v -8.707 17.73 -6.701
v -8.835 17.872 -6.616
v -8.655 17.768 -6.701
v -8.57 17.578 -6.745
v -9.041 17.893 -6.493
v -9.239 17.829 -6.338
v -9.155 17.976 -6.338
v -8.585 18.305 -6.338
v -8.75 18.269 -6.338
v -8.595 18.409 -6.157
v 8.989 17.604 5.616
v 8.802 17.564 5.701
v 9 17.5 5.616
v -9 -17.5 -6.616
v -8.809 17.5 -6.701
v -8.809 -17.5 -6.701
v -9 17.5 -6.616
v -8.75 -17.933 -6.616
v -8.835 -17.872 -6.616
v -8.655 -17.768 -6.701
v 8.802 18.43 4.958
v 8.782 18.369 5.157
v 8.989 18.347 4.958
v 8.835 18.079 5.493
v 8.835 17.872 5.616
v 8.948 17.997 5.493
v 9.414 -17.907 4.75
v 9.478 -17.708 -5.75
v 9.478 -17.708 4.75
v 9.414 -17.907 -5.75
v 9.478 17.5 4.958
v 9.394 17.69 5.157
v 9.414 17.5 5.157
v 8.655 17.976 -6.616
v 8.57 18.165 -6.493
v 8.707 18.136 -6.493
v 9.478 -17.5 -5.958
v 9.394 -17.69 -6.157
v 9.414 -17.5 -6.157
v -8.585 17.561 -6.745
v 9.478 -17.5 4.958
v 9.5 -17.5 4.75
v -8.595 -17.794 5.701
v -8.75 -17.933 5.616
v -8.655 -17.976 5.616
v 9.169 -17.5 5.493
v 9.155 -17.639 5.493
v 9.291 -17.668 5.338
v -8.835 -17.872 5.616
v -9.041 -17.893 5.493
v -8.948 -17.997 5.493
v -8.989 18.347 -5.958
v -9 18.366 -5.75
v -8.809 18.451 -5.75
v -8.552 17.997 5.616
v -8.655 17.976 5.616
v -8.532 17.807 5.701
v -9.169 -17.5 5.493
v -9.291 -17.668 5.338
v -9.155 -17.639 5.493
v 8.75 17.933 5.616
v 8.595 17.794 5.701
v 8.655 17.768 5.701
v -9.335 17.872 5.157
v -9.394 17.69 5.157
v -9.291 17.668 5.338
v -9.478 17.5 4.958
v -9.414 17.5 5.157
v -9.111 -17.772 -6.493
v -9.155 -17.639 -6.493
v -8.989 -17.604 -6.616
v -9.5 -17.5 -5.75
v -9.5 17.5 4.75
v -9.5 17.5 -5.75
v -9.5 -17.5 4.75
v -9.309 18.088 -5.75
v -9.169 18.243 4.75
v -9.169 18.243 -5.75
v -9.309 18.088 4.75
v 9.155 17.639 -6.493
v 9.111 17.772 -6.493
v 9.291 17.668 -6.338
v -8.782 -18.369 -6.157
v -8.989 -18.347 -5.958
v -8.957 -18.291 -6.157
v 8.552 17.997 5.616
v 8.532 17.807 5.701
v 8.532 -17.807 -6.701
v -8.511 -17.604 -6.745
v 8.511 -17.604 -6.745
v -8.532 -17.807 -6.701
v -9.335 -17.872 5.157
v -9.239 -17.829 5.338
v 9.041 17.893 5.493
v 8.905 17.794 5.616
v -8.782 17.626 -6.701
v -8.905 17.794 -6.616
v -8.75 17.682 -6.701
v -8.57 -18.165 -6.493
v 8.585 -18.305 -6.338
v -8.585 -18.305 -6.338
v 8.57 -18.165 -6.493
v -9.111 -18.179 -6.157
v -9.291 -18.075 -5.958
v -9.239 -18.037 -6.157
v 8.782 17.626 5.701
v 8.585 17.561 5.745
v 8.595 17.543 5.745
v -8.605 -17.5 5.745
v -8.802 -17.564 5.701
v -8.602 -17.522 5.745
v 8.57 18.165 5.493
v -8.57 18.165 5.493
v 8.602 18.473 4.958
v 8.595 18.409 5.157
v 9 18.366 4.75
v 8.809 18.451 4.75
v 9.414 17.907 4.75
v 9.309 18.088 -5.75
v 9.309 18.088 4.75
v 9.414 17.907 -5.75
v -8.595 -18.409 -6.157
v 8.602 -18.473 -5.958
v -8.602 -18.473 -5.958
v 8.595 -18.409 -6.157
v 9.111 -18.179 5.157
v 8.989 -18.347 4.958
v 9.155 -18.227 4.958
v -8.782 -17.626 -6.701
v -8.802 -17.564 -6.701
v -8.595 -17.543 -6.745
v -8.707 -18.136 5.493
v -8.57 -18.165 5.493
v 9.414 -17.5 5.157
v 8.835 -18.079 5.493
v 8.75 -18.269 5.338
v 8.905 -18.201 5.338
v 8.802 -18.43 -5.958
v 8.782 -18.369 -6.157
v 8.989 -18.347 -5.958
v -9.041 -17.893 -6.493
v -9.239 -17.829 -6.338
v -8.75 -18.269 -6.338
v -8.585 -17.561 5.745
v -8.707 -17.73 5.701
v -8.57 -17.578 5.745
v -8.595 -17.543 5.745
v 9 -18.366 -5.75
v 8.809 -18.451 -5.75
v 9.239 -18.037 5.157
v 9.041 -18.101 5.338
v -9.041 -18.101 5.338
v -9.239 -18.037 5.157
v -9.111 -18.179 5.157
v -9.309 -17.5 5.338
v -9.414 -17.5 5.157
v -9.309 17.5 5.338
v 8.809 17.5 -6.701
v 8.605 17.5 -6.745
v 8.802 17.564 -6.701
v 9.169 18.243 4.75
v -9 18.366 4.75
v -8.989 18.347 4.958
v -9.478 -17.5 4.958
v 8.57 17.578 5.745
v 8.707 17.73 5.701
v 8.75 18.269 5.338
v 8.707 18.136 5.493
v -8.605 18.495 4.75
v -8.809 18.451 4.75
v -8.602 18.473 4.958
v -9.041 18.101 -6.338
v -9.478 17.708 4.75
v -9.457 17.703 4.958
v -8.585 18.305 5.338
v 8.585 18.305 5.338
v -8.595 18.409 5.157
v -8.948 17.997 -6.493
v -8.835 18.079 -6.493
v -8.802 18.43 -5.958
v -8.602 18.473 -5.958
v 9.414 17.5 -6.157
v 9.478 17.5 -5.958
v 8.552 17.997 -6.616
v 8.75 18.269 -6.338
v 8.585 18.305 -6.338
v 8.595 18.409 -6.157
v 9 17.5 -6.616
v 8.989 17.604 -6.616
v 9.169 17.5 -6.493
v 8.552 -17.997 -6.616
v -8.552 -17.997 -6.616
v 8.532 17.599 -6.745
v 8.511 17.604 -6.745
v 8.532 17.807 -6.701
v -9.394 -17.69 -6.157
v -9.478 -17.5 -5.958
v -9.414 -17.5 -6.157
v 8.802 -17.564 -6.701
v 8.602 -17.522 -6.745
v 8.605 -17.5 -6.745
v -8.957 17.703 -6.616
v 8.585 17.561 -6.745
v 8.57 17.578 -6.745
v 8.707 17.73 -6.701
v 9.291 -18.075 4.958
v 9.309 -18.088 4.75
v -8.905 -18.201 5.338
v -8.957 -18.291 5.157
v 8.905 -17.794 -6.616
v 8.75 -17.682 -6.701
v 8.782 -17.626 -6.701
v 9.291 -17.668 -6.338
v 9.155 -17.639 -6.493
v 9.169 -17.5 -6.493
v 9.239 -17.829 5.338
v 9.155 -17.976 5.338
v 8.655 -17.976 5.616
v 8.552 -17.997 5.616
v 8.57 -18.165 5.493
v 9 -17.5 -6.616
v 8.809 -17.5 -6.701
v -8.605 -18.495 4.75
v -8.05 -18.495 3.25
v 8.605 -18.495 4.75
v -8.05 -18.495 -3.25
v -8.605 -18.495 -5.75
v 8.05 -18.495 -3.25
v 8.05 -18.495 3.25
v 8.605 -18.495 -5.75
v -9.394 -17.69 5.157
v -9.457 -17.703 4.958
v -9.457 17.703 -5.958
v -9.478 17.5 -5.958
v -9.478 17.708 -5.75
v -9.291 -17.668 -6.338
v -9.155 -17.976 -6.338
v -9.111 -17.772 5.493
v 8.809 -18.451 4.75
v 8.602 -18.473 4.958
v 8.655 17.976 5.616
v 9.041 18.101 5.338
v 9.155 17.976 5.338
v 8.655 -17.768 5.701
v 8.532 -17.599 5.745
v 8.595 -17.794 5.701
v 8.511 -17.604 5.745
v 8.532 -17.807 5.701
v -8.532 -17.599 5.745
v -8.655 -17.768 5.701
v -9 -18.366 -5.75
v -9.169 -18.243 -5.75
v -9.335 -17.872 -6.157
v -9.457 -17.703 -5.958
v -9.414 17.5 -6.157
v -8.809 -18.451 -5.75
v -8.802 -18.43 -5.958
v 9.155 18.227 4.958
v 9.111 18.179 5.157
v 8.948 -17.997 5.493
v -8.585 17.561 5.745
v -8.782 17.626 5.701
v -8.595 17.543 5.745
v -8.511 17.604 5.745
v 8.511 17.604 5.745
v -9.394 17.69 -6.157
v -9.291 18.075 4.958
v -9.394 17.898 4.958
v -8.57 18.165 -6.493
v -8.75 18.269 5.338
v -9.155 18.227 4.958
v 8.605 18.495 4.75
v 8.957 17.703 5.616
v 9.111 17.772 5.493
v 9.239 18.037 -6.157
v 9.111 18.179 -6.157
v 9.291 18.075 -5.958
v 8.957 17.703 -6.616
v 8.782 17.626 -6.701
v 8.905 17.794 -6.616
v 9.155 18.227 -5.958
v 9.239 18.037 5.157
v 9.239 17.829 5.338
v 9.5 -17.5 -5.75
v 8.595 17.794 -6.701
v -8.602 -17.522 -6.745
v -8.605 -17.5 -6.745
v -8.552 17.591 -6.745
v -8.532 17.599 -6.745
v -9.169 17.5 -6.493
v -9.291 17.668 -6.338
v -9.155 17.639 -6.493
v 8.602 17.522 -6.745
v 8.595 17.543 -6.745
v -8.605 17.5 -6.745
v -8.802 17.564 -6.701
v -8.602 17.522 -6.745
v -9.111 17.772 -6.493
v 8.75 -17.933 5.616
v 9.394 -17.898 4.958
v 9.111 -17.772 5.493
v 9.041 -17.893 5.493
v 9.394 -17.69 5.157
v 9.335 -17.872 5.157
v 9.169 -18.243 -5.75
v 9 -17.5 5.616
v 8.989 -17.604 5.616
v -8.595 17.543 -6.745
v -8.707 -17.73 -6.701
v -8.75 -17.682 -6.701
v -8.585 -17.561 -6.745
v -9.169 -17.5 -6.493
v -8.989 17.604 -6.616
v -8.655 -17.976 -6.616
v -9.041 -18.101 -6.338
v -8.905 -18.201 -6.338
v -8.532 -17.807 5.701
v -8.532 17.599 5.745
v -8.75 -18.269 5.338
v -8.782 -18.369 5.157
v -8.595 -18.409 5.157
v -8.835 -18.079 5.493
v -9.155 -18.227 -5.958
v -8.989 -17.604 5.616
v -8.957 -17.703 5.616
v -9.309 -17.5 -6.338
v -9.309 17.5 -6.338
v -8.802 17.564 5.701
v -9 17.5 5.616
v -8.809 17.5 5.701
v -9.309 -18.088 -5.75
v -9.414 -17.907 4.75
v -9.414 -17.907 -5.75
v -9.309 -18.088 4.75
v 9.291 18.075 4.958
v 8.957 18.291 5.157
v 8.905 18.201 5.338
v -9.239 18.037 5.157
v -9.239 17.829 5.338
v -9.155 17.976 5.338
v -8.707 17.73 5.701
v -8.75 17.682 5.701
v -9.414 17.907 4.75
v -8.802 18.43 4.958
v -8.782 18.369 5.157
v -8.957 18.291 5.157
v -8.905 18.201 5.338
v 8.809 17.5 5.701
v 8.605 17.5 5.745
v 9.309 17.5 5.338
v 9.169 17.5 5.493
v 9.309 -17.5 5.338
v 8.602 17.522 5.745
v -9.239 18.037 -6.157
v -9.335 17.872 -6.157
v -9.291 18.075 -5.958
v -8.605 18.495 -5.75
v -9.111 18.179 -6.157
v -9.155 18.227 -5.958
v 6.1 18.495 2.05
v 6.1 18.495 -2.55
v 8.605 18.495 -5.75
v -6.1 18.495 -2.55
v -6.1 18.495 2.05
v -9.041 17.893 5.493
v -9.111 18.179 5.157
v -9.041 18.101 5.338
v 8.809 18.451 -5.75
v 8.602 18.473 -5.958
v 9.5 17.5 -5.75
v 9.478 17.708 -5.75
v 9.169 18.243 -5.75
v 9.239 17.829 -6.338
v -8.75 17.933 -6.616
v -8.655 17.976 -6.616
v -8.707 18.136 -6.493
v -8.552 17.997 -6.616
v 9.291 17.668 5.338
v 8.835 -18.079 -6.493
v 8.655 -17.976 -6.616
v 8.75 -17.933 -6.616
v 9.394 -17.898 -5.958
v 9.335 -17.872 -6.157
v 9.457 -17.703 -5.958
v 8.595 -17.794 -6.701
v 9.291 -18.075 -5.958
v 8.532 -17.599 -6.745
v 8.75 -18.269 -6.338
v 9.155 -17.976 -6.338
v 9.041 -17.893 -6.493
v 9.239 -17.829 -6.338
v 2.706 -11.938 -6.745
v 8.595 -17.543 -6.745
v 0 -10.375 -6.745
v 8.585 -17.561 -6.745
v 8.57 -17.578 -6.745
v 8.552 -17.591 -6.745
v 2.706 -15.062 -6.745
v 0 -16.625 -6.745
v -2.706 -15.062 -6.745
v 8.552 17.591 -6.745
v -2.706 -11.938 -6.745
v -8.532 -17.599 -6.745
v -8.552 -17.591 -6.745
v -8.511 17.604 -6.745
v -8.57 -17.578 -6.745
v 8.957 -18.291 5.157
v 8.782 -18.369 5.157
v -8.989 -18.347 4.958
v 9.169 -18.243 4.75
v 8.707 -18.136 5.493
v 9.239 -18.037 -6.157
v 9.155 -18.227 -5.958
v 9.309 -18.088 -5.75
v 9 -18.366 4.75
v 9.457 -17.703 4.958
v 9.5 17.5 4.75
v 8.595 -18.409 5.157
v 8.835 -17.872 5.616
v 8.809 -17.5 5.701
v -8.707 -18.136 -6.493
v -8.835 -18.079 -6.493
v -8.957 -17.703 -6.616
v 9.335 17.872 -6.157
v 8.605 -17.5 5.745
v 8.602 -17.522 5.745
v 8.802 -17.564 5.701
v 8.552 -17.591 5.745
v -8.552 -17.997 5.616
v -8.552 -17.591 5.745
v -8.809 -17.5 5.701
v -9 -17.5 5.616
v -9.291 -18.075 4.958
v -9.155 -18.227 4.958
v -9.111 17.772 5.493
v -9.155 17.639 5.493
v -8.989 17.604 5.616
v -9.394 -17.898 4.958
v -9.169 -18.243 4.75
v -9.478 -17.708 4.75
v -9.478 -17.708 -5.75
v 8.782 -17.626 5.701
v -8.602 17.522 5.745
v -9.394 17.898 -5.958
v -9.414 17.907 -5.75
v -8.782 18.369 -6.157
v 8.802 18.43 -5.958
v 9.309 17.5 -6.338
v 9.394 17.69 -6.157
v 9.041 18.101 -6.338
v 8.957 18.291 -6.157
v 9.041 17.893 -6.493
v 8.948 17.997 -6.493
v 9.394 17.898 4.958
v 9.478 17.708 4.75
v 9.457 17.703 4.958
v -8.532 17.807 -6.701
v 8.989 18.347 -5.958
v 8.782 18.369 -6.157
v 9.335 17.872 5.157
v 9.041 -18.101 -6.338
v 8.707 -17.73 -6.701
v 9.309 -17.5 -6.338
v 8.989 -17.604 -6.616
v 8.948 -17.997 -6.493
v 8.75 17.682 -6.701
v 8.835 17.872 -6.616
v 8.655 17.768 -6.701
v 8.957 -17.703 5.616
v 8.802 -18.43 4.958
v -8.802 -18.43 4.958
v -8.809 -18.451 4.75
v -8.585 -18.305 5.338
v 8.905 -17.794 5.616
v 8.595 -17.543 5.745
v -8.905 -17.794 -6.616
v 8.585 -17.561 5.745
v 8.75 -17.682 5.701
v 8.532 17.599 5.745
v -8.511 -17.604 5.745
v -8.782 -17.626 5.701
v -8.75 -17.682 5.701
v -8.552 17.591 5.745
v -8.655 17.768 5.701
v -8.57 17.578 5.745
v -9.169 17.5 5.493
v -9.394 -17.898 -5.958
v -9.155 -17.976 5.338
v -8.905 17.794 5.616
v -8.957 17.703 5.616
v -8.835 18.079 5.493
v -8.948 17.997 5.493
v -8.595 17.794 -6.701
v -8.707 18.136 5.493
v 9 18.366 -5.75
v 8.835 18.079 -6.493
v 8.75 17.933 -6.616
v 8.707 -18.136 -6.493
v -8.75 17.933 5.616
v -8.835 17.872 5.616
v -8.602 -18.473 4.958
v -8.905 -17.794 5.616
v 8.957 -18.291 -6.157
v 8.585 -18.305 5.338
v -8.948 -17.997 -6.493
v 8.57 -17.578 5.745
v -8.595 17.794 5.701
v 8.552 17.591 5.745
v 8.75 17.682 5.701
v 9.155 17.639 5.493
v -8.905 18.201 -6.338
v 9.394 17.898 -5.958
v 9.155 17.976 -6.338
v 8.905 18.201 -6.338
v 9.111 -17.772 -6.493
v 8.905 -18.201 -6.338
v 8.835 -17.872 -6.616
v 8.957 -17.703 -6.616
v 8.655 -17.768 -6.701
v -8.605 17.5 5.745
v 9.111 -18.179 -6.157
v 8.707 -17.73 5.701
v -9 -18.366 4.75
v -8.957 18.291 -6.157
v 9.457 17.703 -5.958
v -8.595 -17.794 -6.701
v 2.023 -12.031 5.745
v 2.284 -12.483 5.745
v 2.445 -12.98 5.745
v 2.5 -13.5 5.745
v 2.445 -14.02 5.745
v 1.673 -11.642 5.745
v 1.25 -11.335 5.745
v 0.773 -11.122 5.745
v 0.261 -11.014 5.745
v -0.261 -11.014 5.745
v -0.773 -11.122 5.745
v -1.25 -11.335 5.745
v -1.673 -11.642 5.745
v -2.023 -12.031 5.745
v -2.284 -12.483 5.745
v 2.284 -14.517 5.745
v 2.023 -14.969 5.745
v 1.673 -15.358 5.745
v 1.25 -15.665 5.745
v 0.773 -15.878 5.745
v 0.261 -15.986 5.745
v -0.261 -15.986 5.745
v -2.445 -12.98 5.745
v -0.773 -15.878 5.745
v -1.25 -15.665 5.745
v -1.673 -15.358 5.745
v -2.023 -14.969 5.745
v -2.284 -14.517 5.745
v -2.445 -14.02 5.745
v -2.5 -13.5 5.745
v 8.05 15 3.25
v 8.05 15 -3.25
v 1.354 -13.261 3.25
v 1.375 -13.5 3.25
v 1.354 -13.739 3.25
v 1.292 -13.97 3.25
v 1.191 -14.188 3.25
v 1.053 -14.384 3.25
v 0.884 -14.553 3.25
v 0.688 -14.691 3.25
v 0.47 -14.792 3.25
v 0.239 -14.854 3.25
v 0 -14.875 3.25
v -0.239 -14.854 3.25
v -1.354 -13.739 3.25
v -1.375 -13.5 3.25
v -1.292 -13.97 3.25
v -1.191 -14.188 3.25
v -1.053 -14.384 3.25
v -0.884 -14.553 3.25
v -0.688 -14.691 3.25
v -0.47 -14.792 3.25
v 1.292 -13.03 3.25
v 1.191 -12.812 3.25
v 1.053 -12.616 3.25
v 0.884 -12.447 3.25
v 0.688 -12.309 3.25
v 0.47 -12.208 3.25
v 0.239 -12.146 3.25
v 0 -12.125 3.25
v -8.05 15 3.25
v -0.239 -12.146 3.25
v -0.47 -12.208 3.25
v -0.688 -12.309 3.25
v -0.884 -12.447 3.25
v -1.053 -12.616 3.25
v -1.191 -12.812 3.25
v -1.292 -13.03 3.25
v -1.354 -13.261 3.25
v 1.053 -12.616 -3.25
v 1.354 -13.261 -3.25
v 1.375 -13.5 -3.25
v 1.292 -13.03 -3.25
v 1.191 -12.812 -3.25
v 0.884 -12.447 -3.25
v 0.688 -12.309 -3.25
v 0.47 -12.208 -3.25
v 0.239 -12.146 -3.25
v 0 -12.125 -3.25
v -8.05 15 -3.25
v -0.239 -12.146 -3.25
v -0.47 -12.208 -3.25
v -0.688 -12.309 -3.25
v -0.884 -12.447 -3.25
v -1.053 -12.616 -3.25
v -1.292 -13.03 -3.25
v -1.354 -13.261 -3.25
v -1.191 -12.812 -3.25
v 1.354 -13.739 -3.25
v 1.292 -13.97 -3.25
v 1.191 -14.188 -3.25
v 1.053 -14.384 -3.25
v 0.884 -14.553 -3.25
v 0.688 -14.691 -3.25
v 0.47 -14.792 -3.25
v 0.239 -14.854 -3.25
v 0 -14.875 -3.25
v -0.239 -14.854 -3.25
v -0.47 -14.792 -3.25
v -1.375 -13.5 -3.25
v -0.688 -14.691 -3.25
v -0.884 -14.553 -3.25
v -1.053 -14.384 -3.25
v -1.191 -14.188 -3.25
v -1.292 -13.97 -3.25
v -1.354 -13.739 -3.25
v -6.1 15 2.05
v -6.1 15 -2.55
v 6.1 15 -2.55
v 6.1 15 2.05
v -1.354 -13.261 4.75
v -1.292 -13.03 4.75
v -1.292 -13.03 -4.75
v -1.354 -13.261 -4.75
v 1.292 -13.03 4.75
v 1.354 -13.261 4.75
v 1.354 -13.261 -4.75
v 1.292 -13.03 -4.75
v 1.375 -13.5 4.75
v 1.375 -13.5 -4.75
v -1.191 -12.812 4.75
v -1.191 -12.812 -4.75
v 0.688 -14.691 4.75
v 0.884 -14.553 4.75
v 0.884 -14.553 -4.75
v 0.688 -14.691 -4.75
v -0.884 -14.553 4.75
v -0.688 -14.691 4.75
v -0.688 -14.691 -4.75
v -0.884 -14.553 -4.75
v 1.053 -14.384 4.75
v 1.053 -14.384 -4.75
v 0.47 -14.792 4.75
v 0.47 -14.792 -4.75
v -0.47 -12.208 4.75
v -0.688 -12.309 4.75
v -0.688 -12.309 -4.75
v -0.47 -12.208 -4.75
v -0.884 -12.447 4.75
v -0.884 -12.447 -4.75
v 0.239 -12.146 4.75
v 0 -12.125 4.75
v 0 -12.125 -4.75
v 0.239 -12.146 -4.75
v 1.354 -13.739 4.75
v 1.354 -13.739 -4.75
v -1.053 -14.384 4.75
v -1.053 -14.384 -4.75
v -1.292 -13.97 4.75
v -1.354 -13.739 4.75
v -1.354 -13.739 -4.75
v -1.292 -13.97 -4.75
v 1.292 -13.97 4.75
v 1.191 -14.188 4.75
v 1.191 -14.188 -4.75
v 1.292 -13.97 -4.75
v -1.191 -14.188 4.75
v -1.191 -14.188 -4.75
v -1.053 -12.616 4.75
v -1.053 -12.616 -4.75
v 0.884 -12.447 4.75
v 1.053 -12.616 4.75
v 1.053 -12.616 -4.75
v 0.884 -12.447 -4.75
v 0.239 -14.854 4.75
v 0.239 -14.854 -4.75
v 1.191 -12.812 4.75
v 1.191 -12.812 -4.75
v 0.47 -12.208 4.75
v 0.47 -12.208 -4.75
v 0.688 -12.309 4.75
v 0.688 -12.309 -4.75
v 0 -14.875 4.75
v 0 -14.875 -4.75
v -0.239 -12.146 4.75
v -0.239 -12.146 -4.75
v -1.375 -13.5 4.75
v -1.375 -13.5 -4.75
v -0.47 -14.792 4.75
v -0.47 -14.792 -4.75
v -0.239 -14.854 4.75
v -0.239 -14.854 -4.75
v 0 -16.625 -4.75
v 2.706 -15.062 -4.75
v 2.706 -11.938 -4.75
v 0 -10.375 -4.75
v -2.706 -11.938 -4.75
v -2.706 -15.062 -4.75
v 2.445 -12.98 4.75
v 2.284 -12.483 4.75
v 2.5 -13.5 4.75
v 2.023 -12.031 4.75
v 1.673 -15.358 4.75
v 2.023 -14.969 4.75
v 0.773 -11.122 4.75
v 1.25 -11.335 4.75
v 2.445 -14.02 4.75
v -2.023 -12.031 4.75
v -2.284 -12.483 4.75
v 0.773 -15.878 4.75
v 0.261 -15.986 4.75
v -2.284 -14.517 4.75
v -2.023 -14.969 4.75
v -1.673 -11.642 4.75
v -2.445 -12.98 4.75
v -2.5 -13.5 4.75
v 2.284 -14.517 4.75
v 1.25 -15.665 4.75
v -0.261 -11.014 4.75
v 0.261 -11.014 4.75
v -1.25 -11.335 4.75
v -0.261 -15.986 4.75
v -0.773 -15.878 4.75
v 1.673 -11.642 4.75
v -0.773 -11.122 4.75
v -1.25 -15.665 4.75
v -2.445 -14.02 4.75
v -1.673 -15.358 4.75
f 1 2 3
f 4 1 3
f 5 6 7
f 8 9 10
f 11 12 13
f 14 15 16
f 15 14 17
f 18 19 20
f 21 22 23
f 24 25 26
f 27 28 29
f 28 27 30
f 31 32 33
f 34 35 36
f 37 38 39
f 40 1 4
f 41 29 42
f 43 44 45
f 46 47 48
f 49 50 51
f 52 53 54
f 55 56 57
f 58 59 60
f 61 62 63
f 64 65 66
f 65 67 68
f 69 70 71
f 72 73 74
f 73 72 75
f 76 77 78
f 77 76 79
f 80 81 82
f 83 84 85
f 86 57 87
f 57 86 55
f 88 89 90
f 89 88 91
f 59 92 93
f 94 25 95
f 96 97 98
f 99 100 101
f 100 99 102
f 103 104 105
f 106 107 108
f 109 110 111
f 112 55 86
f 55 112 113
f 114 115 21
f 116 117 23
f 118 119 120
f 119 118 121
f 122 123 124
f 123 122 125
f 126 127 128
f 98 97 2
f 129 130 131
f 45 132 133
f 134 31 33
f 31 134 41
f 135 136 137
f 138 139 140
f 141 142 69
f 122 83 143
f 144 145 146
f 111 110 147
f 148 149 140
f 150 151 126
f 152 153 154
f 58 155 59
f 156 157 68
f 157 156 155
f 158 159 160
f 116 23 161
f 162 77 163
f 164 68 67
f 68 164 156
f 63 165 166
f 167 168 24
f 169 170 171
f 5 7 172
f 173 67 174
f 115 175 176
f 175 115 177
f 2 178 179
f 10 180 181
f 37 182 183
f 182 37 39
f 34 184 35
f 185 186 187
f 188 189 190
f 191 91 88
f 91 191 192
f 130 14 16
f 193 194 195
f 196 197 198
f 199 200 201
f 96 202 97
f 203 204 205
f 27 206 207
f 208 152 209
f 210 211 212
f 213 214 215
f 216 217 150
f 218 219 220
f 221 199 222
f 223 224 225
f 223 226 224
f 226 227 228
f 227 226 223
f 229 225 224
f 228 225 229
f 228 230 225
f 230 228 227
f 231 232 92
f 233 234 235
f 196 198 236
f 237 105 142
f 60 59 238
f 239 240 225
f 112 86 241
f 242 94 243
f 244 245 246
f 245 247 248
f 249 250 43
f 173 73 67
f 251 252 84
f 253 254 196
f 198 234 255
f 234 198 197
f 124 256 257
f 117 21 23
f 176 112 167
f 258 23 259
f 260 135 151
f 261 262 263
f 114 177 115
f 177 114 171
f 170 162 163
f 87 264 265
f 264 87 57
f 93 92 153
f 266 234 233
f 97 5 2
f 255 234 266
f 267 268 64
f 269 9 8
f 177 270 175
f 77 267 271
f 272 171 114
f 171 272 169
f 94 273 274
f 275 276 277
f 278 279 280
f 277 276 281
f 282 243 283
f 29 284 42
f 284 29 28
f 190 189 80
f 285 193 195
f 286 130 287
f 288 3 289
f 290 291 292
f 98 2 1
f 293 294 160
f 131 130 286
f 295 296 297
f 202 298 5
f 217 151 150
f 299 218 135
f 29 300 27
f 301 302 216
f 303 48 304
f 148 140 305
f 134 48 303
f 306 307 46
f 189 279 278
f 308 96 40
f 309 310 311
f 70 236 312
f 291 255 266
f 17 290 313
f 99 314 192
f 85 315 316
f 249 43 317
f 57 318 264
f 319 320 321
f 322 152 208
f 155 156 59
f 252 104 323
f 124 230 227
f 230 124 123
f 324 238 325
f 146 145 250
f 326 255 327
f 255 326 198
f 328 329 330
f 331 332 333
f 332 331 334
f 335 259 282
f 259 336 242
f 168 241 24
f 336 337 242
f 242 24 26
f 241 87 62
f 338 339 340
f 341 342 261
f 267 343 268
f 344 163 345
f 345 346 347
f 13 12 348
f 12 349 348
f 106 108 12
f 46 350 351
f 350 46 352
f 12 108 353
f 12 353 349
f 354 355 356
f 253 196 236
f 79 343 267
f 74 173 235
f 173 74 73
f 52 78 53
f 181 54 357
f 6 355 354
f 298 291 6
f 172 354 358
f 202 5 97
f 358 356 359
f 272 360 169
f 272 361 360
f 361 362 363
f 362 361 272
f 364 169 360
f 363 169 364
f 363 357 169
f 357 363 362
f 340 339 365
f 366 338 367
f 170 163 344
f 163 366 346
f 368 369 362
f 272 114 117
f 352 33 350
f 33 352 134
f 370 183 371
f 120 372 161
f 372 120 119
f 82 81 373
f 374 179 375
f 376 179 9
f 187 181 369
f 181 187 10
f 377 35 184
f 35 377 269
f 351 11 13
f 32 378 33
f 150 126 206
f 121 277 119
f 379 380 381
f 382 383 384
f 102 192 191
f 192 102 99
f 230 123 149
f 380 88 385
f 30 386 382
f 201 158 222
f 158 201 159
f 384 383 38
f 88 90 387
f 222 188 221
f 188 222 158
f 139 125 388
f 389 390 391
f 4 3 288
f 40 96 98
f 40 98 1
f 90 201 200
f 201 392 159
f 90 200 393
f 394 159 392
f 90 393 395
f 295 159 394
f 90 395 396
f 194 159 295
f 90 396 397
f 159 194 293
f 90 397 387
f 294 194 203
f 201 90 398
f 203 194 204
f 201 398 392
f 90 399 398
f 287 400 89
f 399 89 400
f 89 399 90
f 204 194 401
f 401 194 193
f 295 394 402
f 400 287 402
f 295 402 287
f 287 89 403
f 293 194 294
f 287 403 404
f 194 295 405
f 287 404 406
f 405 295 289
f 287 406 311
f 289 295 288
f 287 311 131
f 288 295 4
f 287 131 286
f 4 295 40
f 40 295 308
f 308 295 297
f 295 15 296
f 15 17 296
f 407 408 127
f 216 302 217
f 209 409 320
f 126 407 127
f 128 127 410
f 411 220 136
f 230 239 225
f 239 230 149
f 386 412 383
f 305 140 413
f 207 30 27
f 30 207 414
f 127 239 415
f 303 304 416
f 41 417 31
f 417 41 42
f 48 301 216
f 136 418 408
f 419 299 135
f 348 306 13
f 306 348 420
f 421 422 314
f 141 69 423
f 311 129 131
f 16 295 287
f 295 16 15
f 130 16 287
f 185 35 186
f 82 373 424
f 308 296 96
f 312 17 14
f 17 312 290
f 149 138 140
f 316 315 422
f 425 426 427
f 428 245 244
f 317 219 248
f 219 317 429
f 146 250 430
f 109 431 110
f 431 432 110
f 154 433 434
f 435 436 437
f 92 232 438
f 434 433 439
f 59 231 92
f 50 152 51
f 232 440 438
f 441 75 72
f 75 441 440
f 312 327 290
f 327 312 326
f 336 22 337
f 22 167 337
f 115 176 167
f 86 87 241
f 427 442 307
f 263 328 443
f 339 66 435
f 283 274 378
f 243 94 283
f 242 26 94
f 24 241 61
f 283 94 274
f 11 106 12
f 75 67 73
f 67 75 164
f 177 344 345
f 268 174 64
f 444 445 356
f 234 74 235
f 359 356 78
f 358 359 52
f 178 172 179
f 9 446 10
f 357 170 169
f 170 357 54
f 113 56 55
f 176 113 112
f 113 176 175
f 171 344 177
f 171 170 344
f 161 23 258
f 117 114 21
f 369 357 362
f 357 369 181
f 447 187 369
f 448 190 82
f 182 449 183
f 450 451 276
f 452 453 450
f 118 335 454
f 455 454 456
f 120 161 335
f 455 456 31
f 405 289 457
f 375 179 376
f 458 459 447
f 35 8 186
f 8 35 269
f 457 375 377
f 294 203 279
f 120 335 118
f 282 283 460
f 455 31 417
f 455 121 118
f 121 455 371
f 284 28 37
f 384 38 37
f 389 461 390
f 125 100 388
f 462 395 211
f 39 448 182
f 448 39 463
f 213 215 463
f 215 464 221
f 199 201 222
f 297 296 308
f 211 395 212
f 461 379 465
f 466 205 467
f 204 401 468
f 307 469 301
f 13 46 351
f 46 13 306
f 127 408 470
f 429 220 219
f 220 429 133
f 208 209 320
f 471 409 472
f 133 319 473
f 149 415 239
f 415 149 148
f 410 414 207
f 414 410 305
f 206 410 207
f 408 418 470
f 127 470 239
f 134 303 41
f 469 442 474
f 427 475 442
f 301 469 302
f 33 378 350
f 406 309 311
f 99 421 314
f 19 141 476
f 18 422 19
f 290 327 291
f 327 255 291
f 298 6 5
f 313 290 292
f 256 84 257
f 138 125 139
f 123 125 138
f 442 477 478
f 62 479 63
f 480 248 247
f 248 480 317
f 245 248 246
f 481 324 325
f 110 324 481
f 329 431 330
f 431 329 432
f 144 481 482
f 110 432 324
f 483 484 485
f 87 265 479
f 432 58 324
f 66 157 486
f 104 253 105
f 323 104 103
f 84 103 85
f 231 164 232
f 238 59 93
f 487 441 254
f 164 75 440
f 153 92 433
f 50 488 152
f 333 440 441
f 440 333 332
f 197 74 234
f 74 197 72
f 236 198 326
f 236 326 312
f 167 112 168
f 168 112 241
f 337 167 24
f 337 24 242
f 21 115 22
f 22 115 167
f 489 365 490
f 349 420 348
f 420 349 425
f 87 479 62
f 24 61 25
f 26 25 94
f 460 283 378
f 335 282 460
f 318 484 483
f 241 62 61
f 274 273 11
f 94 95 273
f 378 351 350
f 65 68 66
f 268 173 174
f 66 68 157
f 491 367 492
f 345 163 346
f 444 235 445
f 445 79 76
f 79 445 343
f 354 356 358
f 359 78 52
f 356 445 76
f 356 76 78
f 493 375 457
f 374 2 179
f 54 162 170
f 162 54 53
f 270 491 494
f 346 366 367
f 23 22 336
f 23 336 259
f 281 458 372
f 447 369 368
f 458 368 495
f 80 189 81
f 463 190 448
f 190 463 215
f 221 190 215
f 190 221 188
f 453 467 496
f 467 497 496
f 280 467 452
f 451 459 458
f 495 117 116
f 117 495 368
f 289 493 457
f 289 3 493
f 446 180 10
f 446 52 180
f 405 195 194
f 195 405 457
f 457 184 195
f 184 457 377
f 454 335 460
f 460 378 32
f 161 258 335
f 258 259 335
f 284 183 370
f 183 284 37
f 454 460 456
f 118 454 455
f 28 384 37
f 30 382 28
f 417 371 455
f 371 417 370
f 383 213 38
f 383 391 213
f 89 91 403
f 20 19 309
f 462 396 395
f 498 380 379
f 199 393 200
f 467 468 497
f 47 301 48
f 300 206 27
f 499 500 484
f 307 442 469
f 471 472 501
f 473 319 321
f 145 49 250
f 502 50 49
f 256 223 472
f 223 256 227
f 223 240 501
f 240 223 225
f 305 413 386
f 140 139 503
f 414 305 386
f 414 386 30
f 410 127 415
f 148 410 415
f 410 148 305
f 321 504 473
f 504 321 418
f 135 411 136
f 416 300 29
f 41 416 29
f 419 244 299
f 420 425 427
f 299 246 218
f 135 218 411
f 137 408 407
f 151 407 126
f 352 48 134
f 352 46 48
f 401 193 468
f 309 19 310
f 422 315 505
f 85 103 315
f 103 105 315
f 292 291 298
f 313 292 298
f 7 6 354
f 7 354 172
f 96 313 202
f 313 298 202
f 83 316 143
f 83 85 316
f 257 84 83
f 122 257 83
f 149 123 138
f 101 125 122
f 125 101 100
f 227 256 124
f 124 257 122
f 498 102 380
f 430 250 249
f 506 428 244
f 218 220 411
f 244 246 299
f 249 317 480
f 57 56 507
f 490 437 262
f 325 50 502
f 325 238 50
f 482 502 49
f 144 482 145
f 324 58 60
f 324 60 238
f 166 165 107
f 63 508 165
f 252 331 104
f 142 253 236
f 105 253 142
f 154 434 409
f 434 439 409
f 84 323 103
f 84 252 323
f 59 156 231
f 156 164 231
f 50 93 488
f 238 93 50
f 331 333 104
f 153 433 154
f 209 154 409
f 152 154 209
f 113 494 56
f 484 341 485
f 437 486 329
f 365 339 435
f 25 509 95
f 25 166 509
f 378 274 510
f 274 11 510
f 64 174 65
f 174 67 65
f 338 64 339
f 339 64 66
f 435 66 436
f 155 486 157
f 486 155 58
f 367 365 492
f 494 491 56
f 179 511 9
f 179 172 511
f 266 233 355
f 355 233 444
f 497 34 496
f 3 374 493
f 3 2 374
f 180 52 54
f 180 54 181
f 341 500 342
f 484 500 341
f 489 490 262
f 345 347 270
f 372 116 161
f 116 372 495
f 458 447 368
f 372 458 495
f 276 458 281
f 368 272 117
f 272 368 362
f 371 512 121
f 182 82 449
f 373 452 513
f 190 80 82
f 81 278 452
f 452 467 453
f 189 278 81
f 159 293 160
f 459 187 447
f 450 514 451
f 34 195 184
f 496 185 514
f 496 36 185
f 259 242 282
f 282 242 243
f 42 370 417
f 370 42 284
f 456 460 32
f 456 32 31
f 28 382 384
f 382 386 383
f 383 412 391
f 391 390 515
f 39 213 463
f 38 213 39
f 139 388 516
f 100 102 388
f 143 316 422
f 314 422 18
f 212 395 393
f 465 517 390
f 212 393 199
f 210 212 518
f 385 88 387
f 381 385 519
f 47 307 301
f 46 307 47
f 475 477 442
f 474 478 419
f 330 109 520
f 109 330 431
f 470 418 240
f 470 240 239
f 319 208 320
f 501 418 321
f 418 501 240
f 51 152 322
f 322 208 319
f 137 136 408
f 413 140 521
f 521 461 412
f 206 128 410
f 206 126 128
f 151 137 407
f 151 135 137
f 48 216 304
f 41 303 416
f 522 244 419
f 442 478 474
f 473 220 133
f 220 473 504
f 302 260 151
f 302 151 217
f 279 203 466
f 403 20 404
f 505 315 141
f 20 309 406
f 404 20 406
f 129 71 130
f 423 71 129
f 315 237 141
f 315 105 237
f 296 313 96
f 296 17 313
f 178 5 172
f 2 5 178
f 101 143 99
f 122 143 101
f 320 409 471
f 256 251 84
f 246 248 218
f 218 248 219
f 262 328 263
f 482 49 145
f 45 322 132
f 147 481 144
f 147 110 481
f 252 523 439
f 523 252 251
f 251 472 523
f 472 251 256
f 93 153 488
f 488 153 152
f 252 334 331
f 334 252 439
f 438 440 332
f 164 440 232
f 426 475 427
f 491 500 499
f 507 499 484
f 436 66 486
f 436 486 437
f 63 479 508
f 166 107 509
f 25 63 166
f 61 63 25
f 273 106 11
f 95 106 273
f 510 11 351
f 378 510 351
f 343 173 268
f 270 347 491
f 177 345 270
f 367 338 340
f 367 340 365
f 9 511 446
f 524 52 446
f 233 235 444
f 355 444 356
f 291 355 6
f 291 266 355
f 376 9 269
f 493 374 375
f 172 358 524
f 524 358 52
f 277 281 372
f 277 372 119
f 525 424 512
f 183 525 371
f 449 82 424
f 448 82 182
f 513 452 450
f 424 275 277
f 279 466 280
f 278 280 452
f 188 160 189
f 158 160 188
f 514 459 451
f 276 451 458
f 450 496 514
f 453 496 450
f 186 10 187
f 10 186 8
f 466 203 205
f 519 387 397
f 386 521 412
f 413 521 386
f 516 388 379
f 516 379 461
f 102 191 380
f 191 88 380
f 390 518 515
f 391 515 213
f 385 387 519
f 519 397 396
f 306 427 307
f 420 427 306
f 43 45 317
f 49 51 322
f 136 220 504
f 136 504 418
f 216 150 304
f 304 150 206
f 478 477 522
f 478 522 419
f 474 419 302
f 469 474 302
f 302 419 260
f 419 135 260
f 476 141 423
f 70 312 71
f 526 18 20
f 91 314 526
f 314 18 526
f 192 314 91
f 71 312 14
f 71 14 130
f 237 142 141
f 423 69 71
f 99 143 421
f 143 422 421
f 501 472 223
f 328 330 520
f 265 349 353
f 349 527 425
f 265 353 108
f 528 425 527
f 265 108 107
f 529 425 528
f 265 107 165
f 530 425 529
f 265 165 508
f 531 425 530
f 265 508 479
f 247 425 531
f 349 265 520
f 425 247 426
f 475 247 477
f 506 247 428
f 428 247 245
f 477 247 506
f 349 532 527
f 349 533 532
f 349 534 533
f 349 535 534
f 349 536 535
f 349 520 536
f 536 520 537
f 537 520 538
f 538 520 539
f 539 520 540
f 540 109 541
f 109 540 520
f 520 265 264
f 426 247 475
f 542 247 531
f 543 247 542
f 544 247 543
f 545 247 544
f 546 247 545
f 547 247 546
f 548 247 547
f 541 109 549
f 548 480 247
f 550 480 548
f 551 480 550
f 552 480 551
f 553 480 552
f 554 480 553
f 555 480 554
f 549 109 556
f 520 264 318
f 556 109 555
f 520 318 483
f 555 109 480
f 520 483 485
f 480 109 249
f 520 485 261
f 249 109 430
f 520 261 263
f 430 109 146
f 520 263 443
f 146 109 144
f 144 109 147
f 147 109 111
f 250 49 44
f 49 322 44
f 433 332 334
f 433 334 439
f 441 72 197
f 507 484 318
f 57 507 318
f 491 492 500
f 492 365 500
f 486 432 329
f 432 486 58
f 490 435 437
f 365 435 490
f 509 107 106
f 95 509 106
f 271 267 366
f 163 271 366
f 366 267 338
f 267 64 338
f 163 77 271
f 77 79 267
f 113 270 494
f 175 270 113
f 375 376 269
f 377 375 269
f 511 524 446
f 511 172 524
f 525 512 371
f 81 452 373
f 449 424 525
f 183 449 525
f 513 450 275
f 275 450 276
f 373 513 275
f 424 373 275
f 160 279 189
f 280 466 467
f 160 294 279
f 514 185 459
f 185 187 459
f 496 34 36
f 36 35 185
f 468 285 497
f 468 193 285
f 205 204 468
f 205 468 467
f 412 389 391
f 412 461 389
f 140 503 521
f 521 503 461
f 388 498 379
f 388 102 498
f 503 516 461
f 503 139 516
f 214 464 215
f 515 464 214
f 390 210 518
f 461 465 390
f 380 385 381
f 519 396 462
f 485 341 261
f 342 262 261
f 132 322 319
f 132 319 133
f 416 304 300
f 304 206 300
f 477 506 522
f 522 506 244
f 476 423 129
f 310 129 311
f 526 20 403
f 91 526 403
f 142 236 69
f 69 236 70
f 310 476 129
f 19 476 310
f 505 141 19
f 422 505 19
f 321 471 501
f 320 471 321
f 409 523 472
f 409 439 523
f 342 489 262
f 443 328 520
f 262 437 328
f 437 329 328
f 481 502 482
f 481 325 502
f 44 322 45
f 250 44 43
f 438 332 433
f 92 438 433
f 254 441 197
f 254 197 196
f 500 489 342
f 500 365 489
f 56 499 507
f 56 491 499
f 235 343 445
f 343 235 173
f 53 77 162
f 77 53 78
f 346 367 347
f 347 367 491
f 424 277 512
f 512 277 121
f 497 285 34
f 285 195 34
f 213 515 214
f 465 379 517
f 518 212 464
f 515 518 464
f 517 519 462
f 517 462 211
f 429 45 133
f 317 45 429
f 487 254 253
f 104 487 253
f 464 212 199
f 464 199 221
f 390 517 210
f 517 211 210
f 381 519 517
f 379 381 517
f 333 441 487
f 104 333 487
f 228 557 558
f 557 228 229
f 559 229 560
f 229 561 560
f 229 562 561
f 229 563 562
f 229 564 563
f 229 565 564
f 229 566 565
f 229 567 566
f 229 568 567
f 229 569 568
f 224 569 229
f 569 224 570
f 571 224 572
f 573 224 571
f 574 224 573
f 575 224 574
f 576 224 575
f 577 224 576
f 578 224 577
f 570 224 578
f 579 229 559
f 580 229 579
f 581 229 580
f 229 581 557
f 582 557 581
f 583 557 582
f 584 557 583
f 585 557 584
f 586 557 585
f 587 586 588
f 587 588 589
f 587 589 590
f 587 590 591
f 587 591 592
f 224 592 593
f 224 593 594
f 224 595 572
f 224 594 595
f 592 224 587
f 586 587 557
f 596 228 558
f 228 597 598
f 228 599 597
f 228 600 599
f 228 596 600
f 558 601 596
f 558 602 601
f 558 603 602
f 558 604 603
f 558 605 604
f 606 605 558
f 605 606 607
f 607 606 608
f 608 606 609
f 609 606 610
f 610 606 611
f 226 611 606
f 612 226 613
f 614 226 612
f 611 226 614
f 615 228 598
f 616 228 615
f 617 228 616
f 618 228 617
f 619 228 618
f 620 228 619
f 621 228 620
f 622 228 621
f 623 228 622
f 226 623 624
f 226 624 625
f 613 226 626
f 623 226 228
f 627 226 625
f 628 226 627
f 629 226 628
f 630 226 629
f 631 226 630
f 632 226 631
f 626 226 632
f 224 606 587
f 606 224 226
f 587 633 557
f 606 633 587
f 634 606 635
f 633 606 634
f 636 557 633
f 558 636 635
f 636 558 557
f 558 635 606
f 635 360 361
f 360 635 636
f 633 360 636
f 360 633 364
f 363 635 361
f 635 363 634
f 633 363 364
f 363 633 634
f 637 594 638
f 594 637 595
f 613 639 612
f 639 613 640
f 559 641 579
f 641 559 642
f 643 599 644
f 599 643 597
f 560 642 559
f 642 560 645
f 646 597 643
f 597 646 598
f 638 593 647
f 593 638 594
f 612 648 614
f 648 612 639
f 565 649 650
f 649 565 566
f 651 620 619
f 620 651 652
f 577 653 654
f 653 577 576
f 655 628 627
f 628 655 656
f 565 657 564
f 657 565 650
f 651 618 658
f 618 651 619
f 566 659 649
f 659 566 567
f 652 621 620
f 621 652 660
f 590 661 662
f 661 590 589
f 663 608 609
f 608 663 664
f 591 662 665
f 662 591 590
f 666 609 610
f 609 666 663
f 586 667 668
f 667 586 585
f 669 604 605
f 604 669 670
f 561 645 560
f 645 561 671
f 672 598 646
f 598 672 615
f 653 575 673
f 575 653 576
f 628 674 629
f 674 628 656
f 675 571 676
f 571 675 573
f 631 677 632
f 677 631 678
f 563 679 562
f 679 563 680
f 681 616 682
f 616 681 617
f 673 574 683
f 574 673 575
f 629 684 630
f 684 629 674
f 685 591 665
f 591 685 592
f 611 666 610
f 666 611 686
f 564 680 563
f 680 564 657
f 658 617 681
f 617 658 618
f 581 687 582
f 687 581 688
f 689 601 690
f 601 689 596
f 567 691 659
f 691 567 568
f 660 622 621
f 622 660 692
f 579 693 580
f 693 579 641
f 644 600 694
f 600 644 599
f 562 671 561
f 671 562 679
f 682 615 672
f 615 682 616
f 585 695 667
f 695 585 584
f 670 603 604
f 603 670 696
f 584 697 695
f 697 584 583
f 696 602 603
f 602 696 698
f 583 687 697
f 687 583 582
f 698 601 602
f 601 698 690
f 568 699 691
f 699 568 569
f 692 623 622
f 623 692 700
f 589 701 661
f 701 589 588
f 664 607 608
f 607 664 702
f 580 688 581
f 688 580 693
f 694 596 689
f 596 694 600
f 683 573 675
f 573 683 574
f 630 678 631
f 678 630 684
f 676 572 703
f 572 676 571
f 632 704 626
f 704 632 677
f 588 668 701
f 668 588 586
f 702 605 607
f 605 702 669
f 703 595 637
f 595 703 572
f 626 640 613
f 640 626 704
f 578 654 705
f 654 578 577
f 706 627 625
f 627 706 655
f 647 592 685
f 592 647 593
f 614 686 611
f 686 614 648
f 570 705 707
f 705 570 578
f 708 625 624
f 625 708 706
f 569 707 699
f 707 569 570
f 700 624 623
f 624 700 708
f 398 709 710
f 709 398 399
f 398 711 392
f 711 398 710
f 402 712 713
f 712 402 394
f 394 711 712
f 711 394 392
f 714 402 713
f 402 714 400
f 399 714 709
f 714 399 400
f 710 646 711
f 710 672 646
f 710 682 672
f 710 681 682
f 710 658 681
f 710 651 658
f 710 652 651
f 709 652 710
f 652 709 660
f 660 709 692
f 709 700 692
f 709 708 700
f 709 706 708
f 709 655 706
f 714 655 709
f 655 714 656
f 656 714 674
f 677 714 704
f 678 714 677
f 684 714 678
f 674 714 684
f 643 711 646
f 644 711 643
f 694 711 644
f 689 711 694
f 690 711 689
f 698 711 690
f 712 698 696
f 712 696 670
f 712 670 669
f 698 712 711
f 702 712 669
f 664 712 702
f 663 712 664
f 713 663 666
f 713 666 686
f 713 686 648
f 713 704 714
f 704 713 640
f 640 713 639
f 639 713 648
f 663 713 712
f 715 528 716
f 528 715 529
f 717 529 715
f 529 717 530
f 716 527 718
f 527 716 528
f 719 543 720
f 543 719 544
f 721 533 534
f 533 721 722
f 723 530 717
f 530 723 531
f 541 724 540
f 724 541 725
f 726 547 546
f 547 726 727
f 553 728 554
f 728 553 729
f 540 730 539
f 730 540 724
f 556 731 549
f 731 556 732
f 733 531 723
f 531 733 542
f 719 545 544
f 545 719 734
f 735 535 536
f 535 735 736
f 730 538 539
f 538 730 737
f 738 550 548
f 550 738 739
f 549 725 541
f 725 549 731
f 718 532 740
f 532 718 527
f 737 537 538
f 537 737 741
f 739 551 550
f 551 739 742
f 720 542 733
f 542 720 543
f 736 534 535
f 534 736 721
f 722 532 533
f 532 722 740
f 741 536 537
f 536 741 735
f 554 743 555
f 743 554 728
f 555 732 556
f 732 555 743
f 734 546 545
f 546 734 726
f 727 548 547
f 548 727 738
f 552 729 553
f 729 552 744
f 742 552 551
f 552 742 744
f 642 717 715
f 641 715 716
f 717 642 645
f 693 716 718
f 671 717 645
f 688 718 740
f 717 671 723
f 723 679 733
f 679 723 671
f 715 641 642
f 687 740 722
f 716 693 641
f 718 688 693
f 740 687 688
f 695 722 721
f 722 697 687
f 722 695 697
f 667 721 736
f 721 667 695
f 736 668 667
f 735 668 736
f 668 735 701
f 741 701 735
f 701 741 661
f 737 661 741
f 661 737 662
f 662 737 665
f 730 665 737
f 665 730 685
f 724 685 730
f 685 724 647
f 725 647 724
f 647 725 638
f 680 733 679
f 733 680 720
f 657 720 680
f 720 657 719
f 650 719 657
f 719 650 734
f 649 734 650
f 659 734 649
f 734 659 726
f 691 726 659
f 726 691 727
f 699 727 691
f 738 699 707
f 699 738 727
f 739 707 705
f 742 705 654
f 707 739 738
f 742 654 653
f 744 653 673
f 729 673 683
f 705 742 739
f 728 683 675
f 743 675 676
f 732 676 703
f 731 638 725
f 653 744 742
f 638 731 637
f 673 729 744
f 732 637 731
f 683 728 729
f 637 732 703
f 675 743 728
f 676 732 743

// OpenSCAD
/*
 * Blaustahl Alt Case
 * Copyright (c) 2024 Lone Dynamics Corporation. All rights reserved.
 *
 * required hardware:
 *  - 1 x M2.5 x 12mm countersunk bolt
 *  - 1 x M2.5 nut
 *
 */
 
$fn = 30;

box_width = 19;
box_length = 37;
box_height = 12.5;
box_thickness = 2.0;

lid_thickness = 3;

cutout_width = 16.10;
cutout_length = 40;
cutout_height = 6.5;

cutout_usb_width = 12.2;

board_height = 1.4;

roundness = 1;

//color([0.8,0.8,0.8]) ldp_lid(3.5);
//ldp_board(-1.75);
translate([0,0,-0.5]) ldp_case();
//ldp_endcap(0);

// m2.5 bolt
//translate([0,-13.5,-6.25]) color([1,0,0]) cylinder(d=2.5, h=12, $fn=36);

// m2.5 nut
//translate([0,-13.5,-6.55]) rotate(30) color([1,0,0]) cylinder(d=5.8, h=2.4, $fn=6);

module ldp_endcap(o)
{
		 
	translate([0,-17.75,-1]) rotate([90,0,0])
		linear_extrude(1)
			text("BLAUSTAHL", size=2, halign="center", font="Lato");
	
	difference() {
		union() {
			translate([0,-13.5,o-0.775]) color([0,0,1]) cylinder(d=6, h=4, $fn=36);
			translate([0,-13.5,o-3.225]) color([0,0,1]) cylinder(d=4, h=3.5, $fn=36);
			translate([0,-13.5,o-3.225]) color([0,0,1]) cylinder(d=8, h=1, $fn=36);
			translate([0,-16,0]) cube([16,5,6.45], center=true);
		}
		translate([0,-13.5,-4.25]) color([1,0,0]) cylinder(d=3, h=8, $fn=36);
		
	}
}

module ldp_board(o)
{
	
	difference() {
		union() {
			translate([0,2,o])
				color([0.0,0.8,0.0]) cube([16, 30, 1.6], center=true);
			translate([0,23,o+1.45])
				color([0.9,0.9,0.9]) cube([12, 15, 4.5], center=true);
		}
		translate([0,-13,-10]) cylinder(d=4.2, h=100);
	}
	
}

module ldp_case()
{
	
	difference() {
		
		minkowski() {
			cube([box_width-(roundness*2),box_length-(roundness*2),box_height-(roundness*2)],
				center=true);
			sphere(roundness);
		}
	
		translate([0,-5,(box_height-cutout_height)/2-2.5])
			cube([cutout_width,cutout_length,cutout_height], center=true);

		// USB cutout
		translate([0,15,0.25])
			cube([cutout_usb_width,10,4.6], center=true);

		// bolt hole
		translate([0,-13.5,-5]) cylinder(d=2.75, h=100, $fn=36);
		
		// nut cutout
		translate([0,-13.5,-6.75]) rotate(30) cylinder(d=6.25, h=2.5, $fn=6);
		
		// lid notch cutout
		translate([0,-13.5,5.25]) cylinder(d=5, h=100);

	}

}
